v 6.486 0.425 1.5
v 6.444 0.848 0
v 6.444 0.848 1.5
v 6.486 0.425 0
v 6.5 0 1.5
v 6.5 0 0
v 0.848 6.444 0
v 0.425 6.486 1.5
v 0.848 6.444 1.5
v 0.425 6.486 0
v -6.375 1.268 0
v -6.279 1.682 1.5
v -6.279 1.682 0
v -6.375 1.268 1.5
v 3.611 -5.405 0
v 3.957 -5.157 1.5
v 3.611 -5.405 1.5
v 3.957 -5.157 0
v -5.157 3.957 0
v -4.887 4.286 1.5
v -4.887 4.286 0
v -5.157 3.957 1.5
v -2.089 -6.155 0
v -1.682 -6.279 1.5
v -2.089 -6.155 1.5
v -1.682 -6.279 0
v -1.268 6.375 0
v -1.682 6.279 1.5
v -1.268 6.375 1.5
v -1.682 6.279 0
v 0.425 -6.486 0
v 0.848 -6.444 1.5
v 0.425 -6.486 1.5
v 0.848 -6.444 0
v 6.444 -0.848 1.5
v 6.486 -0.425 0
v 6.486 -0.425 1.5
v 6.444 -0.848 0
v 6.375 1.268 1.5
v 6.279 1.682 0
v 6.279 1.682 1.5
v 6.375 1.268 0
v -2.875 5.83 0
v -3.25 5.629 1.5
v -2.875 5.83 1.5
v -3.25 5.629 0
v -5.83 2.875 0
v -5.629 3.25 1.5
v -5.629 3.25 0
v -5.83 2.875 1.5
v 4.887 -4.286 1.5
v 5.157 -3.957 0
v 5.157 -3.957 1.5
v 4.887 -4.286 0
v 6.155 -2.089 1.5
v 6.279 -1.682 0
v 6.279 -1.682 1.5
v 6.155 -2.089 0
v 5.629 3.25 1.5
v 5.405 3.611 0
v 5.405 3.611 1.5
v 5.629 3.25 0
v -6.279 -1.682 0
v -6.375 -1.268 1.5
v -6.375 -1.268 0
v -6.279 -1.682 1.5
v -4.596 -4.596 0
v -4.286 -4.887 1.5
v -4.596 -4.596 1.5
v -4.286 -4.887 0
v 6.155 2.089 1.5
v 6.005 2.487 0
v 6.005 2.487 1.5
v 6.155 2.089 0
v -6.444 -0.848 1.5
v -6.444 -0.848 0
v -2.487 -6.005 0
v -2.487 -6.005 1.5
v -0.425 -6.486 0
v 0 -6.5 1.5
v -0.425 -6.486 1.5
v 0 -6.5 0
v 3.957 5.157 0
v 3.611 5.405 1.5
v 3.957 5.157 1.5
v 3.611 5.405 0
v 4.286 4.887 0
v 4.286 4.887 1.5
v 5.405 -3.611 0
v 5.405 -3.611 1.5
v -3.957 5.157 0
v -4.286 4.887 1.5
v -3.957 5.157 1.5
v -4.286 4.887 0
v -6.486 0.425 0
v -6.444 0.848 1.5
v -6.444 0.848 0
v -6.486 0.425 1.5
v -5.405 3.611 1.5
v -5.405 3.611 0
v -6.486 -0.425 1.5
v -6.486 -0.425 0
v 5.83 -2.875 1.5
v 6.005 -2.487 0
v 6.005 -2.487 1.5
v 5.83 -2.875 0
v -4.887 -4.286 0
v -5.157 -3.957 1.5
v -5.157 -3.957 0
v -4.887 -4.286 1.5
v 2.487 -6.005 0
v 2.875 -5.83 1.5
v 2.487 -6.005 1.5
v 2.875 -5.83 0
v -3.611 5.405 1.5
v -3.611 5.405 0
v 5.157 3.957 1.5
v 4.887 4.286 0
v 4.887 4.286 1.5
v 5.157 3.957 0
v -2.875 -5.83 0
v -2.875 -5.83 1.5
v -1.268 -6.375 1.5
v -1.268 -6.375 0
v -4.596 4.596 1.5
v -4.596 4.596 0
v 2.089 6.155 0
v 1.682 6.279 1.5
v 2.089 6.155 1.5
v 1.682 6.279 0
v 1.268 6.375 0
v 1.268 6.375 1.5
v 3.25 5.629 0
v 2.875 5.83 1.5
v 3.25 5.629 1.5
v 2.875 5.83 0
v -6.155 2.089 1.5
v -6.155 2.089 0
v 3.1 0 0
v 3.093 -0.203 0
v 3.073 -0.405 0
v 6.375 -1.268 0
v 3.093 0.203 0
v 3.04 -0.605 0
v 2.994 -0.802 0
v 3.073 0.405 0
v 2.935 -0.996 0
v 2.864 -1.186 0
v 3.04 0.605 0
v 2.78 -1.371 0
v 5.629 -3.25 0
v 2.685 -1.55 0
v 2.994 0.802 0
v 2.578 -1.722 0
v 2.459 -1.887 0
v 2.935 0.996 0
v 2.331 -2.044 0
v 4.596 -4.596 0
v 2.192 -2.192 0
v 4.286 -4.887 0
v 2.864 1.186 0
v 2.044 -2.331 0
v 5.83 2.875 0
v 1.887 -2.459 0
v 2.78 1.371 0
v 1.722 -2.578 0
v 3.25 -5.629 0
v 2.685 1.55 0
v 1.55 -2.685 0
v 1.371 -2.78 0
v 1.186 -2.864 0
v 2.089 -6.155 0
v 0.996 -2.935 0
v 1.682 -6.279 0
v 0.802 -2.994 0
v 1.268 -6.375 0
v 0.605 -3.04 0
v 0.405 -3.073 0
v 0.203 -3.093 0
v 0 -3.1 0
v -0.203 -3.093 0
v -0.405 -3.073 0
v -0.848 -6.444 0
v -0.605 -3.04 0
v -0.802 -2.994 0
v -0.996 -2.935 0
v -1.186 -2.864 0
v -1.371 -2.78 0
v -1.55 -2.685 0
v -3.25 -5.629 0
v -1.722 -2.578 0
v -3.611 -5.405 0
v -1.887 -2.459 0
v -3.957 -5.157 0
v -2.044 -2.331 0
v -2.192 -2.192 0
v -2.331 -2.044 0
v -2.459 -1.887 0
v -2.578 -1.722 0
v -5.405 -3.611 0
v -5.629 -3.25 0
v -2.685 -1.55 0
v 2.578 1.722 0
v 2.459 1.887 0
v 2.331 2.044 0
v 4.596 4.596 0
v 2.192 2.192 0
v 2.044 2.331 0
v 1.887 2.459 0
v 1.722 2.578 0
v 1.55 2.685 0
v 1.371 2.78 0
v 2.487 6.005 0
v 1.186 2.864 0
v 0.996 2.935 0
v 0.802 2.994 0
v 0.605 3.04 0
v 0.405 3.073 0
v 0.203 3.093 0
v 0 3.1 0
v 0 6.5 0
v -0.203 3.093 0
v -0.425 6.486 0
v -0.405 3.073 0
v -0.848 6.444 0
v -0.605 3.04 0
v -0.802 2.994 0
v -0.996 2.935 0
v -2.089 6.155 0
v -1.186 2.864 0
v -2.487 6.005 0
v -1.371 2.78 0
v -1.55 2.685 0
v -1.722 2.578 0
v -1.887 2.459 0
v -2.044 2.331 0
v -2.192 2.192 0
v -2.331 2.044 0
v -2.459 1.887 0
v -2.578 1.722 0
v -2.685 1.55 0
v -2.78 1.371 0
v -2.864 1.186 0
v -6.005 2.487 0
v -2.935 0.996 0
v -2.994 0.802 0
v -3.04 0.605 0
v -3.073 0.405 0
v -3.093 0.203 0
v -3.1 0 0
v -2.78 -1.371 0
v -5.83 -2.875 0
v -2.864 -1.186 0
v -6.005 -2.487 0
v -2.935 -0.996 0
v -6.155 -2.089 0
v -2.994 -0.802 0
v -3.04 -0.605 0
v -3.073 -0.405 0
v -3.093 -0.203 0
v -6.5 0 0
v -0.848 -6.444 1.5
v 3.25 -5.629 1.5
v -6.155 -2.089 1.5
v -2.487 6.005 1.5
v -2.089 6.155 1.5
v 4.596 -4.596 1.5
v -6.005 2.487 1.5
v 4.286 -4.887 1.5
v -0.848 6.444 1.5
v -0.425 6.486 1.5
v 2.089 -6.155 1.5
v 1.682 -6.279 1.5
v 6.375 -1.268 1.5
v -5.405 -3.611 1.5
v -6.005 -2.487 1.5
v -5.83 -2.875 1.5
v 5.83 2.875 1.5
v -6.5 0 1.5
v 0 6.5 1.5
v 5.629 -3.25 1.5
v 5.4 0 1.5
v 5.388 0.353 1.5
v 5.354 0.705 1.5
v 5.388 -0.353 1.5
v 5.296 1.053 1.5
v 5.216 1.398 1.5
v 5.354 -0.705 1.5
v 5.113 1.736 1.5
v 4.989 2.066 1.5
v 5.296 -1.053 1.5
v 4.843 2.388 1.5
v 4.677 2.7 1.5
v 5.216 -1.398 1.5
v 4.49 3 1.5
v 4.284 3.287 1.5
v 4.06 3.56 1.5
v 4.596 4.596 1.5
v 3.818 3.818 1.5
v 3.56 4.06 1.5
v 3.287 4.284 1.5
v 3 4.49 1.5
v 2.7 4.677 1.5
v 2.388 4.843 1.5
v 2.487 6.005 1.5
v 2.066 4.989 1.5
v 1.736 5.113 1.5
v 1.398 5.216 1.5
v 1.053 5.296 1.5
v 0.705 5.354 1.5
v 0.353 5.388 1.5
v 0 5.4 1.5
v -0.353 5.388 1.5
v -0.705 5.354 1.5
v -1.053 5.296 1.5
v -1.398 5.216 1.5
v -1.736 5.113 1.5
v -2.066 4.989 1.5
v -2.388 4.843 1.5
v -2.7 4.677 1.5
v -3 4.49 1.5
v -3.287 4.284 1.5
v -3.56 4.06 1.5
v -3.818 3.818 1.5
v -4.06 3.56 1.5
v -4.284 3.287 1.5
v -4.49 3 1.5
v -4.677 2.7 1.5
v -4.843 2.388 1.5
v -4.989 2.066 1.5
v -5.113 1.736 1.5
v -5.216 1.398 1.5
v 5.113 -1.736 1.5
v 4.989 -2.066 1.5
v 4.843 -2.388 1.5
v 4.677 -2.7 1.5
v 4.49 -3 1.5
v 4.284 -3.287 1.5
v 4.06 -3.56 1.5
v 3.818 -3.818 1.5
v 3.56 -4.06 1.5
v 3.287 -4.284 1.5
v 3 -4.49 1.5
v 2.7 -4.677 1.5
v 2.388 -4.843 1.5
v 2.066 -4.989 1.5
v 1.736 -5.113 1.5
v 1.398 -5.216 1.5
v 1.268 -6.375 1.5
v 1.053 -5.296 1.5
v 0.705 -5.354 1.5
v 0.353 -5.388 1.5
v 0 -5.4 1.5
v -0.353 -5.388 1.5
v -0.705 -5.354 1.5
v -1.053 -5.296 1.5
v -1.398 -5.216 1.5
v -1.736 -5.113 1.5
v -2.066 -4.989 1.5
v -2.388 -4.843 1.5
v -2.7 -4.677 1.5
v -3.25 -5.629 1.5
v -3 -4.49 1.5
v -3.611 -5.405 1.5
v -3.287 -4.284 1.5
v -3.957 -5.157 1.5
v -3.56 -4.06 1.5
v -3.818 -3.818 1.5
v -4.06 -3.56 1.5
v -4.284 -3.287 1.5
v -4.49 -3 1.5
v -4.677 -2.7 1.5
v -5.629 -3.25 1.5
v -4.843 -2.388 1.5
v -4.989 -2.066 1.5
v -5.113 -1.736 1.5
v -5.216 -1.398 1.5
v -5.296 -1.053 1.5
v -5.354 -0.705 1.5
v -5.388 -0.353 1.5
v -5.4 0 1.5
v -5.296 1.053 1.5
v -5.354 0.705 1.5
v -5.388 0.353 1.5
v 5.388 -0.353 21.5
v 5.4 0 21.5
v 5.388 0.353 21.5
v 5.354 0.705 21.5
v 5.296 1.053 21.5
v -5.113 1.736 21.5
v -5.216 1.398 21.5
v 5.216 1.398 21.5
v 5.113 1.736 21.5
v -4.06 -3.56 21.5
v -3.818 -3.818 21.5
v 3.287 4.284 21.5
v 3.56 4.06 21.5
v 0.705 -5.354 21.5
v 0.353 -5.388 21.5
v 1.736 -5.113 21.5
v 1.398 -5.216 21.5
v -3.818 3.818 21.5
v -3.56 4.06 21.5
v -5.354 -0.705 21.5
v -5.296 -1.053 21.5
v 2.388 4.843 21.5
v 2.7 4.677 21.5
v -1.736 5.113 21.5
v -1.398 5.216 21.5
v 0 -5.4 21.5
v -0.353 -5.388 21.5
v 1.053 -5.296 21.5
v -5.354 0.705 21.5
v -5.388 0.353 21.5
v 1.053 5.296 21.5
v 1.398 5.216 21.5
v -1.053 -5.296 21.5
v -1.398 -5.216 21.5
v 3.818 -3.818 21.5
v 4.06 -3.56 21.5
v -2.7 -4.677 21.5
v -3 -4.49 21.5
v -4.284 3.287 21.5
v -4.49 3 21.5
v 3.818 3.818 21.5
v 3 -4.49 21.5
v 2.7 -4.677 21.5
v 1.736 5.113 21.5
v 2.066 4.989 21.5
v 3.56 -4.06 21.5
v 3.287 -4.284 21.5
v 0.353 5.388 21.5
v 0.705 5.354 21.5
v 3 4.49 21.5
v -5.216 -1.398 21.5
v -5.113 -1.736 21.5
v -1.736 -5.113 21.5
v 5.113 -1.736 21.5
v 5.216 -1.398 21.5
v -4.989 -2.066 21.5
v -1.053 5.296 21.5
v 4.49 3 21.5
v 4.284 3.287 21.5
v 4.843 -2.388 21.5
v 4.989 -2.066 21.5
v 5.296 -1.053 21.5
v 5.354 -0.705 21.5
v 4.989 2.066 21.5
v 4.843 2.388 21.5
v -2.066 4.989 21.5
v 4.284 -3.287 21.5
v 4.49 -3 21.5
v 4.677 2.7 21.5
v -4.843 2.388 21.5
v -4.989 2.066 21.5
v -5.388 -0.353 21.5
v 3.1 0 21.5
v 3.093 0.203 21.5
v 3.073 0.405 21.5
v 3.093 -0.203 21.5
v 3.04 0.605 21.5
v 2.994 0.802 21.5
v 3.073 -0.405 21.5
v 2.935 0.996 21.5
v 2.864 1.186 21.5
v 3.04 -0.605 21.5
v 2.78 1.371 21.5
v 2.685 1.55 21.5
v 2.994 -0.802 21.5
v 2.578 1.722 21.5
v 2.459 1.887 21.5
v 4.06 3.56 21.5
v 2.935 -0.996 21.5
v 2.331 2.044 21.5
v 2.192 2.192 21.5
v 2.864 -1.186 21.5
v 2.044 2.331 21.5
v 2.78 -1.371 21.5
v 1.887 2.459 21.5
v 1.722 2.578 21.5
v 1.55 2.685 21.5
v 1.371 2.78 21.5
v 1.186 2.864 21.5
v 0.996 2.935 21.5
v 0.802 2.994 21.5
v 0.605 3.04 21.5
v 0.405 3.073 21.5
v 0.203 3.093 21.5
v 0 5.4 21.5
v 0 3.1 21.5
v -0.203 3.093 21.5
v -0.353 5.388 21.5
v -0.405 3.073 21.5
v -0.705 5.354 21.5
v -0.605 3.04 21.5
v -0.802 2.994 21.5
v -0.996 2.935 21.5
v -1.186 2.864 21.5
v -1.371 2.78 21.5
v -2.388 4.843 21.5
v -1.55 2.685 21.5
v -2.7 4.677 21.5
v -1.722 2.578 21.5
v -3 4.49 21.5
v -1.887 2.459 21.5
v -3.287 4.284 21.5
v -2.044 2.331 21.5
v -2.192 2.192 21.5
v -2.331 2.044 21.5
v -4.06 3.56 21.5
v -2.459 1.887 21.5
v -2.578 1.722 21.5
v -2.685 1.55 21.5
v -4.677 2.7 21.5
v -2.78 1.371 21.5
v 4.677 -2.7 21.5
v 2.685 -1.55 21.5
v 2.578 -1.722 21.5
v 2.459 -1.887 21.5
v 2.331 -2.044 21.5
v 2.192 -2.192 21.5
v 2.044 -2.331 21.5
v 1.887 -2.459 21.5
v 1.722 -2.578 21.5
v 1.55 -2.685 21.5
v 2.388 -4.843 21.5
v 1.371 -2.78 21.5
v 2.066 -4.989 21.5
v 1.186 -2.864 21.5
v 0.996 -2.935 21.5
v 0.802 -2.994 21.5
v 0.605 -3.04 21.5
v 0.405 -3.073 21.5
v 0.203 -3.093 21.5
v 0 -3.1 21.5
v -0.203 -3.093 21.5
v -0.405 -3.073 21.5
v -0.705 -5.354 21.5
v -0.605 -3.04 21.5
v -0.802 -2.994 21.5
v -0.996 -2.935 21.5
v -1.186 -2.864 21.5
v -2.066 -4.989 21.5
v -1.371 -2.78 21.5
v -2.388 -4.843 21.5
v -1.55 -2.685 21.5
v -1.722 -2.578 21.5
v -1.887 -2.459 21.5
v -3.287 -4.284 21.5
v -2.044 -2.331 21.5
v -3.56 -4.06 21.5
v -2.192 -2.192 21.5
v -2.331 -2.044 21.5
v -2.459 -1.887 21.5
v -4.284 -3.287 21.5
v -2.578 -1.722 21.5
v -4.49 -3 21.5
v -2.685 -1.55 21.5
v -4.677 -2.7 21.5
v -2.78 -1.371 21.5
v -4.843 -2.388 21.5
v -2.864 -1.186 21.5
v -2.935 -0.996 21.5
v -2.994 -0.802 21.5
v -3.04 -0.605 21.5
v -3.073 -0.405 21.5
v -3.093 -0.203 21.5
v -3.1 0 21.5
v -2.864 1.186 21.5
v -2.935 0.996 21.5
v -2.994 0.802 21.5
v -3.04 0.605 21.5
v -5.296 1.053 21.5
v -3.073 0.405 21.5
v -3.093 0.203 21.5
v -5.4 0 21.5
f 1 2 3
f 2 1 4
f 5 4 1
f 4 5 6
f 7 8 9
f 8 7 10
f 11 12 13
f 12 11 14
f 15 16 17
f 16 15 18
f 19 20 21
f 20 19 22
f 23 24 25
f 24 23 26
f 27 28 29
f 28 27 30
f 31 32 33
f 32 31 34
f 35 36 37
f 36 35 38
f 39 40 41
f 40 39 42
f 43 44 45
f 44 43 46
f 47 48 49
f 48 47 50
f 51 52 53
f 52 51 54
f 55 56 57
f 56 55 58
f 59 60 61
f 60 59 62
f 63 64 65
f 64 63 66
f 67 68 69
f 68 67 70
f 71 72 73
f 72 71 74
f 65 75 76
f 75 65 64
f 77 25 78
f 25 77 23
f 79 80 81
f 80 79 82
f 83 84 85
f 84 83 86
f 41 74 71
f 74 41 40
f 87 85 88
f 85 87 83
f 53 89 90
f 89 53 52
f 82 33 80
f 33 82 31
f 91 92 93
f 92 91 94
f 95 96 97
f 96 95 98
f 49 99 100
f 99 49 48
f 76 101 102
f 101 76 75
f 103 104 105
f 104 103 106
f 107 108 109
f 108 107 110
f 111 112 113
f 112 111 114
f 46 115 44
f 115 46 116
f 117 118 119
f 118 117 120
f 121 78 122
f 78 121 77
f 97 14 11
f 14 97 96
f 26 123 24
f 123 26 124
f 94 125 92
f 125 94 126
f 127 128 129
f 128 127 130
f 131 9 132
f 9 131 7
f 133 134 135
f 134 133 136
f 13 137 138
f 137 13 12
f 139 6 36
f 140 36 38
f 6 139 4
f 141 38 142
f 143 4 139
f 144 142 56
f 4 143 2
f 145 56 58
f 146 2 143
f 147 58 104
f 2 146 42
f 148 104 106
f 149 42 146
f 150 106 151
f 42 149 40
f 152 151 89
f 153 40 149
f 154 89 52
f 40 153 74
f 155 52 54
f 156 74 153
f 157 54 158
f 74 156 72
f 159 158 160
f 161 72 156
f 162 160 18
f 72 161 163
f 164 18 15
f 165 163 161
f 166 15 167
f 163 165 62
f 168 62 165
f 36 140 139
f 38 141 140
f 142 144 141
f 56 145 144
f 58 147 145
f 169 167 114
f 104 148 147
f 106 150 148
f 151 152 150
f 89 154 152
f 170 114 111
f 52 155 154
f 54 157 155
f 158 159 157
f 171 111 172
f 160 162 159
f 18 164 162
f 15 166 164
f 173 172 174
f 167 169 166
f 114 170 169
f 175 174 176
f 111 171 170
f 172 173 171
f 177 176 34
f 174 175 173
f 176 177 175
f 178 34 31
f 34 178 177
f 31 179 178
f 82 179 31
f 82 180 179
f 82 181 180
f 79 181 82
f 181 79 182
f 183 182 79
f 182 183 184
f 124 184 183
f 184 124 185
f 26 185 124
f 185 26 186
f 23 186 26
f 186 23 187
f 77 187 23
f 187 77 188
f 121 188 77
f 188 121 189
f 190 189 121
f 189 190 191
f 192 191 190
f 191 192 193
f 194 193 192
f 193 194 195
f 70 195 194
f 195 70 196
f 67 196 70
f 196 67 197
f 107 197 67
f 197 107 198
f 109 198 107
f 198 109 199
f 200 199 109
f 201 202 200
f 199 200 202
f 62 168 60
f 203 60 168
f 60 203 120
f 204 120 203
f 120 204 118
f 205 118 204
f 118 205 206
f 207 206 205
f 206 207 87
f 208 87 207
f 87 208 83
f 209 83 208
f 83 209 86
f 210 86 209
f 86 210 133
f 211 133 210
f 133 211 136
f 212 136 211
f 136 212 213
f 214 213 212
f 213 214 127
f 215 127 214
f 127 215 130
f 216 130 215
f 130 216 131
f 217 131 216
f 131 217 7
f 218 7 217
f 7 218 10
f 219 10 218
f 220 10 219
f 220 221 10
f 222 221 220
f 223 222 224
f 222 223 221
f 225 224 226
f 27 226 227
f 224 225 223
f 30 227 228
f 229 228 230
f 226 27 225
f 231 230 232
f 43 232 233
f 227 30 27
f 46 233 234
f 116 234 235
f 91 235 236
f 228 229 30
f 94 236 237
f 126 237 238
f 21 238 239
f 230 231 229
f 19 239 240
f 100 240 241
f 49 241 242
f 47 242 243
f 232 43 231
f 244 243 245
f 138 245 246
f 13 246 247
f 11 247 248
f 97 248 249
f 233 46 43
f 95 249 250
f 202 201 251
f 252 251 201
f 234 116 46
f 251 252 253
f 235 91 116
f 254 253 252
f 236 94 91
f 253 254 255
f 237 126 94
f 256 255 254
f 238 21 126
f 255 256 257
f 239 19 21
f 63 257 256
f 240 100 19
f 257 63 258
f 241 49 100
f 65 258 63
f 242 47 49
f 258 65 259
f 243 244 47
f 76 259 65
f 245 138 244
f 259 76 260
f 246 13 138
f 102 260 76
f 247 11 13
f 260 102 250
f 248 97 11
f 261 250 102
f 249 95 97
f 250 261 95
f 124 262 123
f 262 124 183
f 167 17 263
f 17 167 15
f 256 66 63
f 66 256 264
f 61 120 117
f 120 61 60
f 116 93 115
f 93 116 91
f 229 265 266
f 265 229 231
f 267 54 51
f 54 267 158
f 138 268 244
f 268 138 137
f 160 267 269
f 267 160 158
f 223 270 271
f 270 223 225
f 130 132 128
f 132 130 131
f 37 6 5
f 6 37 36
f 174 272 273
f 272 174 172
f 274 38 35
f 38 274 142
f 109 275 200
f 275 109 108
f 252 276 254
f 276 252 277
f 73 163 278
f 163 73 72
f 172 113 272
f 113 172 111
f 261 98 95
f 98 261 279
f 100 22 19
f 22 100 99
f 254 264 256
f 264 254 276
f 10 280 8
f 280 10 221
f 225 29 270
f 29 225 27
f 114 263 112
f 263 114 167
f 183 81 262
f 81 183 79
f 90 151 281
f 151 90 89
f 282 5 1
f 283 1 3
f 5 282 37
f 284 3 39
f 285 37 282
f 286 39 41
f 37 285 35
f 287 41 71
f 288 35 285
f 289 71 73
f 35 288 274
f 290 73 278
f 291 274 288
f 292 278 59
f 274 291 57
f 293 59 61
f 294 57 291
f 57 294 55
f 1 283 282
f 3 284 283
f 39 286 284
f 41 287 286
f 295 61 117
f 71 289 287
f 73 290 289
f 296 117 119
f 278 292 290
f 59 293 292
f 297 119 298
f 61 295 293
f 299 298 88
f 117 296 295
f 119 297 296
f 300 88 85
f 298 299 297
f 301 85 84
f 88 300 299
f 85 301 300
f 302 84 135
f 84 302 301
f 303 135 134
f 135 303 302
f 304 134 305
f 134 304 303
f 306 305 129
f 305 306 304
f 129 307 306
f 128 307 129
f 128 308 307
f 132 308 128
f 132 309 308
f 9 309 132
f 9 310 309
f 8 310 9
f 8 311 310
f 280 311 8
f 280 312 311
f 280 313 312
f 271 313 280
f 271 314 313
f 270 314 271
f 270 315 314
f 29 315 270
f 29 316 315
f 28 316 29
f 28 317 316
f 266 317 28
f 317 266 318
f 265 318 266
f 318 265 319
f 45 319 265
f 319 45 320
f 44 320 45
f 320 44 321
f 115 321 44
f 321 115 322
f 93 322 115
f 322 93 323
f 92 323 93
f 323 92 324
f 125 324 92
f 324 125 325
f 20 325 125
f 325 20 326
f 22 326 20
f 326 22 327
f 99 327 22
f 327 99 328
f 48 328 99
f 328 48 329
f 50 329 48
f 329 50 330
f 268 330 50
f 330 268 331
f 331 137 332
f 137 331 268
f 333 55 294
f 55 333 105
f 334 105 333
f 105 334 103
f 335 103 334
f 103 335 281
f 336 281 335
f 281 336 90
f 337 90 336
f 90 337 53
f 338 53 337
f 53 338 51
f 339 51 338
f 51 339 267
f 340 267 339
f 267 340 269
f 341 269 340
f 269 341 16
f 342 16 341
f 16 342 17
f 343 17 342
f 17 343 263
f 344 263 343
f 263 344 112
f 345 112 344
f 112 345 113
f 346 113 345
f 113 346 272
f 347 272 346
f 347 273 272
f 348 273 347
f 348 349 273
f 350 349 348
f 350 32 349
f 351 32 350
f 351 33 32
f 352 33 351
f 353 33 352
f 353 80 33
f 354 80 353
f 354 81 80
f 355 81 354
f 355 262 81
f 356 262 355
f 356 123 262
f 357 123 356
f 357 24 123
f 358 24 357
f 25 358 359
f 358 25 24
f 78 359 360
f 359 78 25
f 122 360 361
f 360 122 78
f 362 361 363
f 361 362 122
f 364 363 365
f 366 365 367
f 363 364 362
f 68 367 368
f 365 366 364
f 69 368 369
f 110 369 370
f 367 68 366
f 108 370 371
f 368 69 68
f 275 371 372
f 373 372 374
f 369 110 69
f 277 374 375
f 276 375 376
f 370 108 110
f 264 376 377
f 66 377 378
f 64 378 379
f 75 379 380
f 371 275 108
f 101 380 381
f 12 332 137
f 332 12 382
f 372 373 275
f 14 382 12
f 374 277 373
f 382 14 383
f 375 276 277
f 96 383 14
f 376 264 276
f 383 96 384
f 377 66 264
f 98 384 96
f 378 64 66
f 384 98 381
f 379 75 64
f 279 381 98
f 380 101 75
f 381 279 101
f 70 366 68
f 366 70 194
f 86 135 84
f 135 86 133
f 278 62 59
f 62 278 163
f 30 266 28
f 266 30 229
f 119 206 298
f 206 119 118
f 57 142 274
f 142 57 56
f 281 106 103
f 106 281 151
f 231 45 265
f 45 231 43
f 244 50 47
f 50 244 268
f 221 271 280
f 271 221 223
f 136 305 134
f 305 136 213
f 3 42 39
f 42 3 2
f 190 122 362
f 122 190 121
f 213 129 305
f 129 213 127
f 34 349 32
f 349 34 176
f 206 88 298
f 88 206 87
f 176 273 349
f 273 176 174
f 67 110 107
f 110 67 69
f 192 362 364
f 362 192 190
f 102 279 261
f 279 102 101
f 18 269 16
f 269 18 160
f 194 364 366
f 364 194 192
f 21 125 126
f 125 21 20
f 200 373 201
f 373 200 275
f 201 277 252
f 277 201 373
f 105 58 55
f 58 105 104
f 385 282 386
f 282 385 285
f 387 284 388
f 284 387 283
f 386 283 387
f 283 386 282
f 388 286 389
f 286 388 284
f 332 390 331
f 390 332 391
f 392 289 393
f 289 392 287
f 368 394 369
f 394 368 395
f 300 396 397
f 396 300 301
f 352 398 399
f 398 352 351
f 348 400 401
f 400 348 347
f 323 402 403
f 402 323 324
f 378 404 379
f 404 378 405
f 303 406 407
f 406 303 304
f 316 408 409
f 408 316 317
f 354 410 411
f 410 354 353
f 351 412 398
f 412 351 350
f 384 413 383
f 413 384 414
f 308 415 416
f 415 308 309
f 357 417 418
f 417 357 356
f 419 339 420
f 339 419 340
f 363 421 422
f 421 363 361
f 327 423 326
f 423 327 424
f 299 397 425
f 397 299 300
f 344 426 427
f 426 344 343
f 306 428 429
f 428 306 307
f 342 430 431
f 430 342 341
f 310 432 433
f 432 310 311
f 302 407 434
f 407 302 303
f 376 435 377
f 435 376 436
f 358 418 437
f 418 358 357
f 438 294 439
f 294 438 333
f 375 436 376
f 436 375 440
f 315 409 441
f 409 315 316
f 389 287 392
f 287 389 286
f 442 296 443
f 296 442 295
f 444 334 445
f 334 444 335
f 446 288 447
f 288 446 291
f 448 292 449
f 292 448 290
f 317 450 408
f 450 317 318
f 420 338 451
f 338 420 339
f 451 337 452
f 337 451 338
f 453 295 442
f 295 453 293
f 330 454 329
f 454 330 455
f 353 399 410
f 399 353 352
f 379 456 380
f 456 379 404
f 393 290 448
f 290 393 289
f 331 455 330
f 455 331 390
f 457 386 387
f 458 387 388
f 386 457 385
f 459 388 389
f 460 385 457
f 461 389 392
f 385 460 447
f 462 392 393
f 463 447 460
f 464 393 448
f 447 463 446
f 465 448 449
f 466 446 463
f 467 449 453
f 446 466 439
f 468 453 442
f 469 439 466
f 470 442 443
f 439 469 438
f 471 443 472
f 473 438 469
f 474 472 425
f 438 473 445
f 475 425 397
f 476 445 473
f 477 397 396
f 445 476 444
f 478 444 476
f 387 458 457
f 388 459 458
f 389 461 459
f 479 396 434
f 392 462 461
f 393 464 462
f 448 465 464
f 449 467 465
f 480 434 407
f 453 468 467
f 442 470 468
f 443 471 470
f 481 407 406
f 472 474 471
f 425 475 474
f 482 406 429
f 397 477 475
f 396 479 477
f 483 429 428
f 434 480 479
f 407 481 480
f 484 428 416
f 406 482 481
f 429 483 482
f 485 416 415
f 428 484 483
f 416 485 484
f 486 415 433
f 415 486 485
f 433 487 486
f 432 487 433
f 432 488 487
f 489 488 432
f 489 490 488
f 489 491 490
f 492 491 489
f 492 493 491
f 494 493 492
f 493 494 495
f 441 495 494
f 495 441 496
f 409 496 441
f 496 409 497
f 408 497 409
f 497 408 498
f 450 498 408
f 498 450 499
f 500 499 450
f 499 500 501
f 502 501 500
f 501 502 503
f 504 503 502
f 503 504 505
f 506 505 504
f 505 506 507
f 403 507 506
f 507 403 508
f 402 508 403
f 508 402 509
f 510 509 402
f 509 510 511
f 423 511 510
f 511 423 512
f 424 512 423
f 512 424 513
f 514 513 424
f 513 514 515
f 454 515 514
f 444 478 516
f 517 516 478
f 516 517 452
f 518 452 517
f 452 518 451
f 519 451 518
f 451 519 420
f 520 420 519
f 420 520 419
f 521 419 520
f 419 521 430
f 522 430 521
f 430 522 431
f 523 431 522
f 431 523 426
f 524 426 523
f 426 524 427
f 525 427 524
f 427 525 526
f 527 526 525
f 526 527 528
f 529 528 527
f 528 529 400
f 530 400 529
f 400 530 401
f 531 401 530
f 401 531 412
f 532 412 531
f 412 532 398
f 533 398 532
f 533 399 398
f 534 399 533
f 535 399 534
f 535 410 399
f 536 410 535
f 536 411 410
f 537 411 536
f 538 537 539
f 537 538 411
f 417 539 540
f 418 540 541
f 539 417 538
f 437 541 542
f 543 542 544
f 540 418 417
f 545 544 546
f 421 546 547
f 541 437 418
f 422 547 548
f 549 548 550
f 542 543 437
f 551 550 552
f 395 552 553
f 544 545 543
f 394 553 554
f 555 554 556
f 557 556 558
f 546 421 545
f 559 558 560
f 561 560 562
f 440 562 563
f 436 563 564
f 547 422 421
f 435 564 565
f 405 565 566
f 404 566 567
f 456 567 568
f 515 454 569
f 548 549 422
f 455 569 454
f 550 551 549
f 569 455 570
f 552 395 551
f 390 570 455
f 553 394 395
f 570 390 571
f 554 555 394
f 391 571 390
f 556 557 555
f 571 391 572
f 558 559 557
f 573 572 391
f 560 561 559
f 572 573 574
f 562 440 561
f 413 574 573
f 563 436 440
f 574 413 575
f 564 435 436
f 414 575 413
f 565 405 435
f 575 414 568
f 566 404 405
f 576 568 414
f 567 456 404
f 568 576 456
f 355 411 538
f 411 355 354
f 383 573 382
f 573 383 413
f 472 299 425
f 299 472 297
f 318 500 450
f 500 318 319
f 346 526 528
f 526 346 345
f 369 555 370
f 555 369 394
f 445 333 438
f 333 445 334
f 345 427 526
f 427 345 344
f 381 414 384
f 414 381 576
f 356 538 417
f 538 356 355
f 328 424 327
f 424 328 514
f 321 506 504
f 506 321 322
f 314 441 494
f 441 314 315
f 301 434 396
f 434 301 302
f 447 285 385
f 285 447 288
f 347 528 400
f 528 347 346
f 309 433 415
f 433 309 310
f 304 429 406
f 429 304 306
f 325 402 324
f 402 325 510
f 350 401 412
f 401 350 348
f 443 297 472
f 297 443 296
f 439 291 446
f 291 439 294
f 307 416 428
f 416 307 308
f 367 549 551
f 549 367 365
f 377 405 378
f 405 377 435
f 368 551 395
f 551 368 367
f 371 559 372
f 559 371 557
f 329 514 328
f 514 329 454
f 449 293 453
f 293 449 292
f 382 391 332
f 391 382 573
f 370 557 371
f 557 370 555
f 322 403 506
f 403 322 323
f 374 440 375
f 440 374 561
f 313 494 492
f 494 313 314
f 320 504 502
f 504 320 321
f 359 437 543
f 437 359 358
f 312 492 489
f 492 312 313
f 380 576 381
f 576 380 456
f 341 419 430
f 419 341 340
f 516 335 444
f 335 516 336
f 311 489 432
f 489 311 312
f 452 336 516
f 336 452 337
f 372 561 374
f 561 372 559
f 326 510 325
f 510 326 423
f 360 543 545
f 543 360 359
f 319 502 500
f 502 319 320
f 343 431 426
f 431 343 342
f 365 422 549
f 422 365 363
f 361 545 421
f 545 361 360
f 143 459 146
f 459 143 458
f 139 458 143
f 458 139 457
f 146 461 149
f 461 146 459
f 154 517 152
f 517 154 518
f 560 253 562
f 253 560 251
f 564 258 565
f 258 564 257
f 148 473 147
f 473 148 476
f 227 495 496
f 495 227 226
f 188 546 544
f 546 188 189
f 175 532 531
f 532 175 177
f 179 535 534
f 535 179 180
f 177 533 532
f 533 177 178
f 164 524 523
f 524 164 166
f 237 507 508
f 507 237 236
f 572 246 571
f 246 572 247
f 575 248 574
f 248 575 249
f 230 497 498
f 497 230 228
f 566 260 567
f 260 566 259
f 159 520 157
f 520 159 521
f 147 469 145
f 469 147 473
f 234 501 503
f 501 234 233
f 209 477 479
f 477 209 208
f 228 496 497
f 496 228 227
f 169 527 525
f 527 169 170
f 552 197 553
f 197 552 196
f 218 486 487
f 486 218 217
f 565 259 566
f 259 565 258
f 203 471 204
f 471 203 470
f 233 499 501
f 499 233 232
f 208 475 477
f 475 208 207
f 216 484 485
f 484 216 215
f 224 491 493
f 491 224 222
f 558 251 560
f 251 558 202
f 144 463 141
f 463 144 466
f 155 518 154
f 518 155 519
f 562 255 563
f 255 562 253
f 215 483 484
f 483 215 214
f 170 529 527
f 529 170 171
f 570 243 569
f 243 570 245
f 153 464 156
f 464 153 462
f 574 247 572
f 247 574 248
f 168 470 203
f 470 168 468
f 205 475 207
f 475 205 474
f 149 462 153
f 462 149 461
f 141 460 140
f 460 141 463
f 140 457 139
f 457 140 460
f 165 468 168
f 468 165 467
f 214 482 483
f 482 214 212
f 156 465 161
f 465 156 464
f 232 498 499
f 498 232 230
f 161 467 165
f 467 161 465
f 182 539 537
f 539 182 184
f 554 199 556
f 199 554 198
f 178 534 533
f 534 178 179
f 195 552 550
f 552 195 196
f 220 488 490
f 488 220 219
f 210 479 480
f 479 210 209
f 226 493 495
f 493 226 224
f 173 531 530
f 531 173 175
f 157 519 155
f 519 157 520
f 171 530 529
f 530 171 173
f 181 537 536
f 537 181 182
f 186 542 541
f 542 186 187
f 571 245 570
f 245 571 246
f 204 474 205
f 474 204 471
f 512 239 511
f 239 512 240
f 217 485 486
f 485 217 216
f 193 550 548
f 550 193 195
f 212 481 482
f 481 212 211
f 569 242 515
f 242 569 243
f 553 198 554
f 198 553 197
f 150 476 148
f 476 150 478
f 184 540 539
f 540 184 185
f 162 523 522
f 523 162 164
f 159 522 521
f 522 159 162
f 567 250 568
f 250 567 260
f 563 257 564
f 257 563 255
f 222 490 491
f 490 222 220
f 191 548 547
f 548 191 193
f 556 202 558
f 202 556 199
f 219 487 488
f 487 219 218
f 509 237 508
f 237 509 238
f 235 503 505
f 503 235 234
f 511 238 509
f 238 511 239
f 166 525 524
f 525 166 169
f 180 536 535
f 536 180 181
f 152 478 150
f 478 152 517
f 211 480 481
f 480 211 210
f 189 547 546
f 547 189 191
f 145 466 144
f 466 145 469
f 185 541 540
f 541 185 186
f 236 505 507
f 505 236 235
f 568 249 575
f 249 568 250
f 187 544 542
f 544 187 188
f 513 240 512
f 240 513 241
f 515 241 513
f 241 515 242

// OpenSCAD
// Adapter sleeve: 0.2 mL PCR tube for a 1.5 mL rack hole
// Print orientation: collar on the bed, sleeve body pointing up (+Z)

$fn = 96;

// ---- Dimensions (mm) ----
collar_d      = 13;    // collar outer diameter
collar_h      = 1.5;   // collar thickness (z = 0 to 1.5)
sleeve_od     = 10.8;  // sleeve body outer diameter
sleeve_h      = 20;    // sleeve body height above collar (z = 1.5 to 21.5)
bore_d        = 6.2;   // through-bore diameter
eps           = 0.5;   // cutter overshoot past faces

total_h = collar_h + sleeve_h;  // overall height (21.5)

difference() {
    union() {
        // Collar
        cylinder(d = collar_d, h = collar_h);
        // Sleeve body (slightly overlapping the collar for a clean union)
        translate([0, 0, collar_h - 0.01])
            cylinder(d = sleeve_od, h = sleeve_h + 0.01);
    }
    // Through-bore
    translate([0, 0, -eps])
        cylinder(d = bore_d, h = total_h + 2 * eps);
}
